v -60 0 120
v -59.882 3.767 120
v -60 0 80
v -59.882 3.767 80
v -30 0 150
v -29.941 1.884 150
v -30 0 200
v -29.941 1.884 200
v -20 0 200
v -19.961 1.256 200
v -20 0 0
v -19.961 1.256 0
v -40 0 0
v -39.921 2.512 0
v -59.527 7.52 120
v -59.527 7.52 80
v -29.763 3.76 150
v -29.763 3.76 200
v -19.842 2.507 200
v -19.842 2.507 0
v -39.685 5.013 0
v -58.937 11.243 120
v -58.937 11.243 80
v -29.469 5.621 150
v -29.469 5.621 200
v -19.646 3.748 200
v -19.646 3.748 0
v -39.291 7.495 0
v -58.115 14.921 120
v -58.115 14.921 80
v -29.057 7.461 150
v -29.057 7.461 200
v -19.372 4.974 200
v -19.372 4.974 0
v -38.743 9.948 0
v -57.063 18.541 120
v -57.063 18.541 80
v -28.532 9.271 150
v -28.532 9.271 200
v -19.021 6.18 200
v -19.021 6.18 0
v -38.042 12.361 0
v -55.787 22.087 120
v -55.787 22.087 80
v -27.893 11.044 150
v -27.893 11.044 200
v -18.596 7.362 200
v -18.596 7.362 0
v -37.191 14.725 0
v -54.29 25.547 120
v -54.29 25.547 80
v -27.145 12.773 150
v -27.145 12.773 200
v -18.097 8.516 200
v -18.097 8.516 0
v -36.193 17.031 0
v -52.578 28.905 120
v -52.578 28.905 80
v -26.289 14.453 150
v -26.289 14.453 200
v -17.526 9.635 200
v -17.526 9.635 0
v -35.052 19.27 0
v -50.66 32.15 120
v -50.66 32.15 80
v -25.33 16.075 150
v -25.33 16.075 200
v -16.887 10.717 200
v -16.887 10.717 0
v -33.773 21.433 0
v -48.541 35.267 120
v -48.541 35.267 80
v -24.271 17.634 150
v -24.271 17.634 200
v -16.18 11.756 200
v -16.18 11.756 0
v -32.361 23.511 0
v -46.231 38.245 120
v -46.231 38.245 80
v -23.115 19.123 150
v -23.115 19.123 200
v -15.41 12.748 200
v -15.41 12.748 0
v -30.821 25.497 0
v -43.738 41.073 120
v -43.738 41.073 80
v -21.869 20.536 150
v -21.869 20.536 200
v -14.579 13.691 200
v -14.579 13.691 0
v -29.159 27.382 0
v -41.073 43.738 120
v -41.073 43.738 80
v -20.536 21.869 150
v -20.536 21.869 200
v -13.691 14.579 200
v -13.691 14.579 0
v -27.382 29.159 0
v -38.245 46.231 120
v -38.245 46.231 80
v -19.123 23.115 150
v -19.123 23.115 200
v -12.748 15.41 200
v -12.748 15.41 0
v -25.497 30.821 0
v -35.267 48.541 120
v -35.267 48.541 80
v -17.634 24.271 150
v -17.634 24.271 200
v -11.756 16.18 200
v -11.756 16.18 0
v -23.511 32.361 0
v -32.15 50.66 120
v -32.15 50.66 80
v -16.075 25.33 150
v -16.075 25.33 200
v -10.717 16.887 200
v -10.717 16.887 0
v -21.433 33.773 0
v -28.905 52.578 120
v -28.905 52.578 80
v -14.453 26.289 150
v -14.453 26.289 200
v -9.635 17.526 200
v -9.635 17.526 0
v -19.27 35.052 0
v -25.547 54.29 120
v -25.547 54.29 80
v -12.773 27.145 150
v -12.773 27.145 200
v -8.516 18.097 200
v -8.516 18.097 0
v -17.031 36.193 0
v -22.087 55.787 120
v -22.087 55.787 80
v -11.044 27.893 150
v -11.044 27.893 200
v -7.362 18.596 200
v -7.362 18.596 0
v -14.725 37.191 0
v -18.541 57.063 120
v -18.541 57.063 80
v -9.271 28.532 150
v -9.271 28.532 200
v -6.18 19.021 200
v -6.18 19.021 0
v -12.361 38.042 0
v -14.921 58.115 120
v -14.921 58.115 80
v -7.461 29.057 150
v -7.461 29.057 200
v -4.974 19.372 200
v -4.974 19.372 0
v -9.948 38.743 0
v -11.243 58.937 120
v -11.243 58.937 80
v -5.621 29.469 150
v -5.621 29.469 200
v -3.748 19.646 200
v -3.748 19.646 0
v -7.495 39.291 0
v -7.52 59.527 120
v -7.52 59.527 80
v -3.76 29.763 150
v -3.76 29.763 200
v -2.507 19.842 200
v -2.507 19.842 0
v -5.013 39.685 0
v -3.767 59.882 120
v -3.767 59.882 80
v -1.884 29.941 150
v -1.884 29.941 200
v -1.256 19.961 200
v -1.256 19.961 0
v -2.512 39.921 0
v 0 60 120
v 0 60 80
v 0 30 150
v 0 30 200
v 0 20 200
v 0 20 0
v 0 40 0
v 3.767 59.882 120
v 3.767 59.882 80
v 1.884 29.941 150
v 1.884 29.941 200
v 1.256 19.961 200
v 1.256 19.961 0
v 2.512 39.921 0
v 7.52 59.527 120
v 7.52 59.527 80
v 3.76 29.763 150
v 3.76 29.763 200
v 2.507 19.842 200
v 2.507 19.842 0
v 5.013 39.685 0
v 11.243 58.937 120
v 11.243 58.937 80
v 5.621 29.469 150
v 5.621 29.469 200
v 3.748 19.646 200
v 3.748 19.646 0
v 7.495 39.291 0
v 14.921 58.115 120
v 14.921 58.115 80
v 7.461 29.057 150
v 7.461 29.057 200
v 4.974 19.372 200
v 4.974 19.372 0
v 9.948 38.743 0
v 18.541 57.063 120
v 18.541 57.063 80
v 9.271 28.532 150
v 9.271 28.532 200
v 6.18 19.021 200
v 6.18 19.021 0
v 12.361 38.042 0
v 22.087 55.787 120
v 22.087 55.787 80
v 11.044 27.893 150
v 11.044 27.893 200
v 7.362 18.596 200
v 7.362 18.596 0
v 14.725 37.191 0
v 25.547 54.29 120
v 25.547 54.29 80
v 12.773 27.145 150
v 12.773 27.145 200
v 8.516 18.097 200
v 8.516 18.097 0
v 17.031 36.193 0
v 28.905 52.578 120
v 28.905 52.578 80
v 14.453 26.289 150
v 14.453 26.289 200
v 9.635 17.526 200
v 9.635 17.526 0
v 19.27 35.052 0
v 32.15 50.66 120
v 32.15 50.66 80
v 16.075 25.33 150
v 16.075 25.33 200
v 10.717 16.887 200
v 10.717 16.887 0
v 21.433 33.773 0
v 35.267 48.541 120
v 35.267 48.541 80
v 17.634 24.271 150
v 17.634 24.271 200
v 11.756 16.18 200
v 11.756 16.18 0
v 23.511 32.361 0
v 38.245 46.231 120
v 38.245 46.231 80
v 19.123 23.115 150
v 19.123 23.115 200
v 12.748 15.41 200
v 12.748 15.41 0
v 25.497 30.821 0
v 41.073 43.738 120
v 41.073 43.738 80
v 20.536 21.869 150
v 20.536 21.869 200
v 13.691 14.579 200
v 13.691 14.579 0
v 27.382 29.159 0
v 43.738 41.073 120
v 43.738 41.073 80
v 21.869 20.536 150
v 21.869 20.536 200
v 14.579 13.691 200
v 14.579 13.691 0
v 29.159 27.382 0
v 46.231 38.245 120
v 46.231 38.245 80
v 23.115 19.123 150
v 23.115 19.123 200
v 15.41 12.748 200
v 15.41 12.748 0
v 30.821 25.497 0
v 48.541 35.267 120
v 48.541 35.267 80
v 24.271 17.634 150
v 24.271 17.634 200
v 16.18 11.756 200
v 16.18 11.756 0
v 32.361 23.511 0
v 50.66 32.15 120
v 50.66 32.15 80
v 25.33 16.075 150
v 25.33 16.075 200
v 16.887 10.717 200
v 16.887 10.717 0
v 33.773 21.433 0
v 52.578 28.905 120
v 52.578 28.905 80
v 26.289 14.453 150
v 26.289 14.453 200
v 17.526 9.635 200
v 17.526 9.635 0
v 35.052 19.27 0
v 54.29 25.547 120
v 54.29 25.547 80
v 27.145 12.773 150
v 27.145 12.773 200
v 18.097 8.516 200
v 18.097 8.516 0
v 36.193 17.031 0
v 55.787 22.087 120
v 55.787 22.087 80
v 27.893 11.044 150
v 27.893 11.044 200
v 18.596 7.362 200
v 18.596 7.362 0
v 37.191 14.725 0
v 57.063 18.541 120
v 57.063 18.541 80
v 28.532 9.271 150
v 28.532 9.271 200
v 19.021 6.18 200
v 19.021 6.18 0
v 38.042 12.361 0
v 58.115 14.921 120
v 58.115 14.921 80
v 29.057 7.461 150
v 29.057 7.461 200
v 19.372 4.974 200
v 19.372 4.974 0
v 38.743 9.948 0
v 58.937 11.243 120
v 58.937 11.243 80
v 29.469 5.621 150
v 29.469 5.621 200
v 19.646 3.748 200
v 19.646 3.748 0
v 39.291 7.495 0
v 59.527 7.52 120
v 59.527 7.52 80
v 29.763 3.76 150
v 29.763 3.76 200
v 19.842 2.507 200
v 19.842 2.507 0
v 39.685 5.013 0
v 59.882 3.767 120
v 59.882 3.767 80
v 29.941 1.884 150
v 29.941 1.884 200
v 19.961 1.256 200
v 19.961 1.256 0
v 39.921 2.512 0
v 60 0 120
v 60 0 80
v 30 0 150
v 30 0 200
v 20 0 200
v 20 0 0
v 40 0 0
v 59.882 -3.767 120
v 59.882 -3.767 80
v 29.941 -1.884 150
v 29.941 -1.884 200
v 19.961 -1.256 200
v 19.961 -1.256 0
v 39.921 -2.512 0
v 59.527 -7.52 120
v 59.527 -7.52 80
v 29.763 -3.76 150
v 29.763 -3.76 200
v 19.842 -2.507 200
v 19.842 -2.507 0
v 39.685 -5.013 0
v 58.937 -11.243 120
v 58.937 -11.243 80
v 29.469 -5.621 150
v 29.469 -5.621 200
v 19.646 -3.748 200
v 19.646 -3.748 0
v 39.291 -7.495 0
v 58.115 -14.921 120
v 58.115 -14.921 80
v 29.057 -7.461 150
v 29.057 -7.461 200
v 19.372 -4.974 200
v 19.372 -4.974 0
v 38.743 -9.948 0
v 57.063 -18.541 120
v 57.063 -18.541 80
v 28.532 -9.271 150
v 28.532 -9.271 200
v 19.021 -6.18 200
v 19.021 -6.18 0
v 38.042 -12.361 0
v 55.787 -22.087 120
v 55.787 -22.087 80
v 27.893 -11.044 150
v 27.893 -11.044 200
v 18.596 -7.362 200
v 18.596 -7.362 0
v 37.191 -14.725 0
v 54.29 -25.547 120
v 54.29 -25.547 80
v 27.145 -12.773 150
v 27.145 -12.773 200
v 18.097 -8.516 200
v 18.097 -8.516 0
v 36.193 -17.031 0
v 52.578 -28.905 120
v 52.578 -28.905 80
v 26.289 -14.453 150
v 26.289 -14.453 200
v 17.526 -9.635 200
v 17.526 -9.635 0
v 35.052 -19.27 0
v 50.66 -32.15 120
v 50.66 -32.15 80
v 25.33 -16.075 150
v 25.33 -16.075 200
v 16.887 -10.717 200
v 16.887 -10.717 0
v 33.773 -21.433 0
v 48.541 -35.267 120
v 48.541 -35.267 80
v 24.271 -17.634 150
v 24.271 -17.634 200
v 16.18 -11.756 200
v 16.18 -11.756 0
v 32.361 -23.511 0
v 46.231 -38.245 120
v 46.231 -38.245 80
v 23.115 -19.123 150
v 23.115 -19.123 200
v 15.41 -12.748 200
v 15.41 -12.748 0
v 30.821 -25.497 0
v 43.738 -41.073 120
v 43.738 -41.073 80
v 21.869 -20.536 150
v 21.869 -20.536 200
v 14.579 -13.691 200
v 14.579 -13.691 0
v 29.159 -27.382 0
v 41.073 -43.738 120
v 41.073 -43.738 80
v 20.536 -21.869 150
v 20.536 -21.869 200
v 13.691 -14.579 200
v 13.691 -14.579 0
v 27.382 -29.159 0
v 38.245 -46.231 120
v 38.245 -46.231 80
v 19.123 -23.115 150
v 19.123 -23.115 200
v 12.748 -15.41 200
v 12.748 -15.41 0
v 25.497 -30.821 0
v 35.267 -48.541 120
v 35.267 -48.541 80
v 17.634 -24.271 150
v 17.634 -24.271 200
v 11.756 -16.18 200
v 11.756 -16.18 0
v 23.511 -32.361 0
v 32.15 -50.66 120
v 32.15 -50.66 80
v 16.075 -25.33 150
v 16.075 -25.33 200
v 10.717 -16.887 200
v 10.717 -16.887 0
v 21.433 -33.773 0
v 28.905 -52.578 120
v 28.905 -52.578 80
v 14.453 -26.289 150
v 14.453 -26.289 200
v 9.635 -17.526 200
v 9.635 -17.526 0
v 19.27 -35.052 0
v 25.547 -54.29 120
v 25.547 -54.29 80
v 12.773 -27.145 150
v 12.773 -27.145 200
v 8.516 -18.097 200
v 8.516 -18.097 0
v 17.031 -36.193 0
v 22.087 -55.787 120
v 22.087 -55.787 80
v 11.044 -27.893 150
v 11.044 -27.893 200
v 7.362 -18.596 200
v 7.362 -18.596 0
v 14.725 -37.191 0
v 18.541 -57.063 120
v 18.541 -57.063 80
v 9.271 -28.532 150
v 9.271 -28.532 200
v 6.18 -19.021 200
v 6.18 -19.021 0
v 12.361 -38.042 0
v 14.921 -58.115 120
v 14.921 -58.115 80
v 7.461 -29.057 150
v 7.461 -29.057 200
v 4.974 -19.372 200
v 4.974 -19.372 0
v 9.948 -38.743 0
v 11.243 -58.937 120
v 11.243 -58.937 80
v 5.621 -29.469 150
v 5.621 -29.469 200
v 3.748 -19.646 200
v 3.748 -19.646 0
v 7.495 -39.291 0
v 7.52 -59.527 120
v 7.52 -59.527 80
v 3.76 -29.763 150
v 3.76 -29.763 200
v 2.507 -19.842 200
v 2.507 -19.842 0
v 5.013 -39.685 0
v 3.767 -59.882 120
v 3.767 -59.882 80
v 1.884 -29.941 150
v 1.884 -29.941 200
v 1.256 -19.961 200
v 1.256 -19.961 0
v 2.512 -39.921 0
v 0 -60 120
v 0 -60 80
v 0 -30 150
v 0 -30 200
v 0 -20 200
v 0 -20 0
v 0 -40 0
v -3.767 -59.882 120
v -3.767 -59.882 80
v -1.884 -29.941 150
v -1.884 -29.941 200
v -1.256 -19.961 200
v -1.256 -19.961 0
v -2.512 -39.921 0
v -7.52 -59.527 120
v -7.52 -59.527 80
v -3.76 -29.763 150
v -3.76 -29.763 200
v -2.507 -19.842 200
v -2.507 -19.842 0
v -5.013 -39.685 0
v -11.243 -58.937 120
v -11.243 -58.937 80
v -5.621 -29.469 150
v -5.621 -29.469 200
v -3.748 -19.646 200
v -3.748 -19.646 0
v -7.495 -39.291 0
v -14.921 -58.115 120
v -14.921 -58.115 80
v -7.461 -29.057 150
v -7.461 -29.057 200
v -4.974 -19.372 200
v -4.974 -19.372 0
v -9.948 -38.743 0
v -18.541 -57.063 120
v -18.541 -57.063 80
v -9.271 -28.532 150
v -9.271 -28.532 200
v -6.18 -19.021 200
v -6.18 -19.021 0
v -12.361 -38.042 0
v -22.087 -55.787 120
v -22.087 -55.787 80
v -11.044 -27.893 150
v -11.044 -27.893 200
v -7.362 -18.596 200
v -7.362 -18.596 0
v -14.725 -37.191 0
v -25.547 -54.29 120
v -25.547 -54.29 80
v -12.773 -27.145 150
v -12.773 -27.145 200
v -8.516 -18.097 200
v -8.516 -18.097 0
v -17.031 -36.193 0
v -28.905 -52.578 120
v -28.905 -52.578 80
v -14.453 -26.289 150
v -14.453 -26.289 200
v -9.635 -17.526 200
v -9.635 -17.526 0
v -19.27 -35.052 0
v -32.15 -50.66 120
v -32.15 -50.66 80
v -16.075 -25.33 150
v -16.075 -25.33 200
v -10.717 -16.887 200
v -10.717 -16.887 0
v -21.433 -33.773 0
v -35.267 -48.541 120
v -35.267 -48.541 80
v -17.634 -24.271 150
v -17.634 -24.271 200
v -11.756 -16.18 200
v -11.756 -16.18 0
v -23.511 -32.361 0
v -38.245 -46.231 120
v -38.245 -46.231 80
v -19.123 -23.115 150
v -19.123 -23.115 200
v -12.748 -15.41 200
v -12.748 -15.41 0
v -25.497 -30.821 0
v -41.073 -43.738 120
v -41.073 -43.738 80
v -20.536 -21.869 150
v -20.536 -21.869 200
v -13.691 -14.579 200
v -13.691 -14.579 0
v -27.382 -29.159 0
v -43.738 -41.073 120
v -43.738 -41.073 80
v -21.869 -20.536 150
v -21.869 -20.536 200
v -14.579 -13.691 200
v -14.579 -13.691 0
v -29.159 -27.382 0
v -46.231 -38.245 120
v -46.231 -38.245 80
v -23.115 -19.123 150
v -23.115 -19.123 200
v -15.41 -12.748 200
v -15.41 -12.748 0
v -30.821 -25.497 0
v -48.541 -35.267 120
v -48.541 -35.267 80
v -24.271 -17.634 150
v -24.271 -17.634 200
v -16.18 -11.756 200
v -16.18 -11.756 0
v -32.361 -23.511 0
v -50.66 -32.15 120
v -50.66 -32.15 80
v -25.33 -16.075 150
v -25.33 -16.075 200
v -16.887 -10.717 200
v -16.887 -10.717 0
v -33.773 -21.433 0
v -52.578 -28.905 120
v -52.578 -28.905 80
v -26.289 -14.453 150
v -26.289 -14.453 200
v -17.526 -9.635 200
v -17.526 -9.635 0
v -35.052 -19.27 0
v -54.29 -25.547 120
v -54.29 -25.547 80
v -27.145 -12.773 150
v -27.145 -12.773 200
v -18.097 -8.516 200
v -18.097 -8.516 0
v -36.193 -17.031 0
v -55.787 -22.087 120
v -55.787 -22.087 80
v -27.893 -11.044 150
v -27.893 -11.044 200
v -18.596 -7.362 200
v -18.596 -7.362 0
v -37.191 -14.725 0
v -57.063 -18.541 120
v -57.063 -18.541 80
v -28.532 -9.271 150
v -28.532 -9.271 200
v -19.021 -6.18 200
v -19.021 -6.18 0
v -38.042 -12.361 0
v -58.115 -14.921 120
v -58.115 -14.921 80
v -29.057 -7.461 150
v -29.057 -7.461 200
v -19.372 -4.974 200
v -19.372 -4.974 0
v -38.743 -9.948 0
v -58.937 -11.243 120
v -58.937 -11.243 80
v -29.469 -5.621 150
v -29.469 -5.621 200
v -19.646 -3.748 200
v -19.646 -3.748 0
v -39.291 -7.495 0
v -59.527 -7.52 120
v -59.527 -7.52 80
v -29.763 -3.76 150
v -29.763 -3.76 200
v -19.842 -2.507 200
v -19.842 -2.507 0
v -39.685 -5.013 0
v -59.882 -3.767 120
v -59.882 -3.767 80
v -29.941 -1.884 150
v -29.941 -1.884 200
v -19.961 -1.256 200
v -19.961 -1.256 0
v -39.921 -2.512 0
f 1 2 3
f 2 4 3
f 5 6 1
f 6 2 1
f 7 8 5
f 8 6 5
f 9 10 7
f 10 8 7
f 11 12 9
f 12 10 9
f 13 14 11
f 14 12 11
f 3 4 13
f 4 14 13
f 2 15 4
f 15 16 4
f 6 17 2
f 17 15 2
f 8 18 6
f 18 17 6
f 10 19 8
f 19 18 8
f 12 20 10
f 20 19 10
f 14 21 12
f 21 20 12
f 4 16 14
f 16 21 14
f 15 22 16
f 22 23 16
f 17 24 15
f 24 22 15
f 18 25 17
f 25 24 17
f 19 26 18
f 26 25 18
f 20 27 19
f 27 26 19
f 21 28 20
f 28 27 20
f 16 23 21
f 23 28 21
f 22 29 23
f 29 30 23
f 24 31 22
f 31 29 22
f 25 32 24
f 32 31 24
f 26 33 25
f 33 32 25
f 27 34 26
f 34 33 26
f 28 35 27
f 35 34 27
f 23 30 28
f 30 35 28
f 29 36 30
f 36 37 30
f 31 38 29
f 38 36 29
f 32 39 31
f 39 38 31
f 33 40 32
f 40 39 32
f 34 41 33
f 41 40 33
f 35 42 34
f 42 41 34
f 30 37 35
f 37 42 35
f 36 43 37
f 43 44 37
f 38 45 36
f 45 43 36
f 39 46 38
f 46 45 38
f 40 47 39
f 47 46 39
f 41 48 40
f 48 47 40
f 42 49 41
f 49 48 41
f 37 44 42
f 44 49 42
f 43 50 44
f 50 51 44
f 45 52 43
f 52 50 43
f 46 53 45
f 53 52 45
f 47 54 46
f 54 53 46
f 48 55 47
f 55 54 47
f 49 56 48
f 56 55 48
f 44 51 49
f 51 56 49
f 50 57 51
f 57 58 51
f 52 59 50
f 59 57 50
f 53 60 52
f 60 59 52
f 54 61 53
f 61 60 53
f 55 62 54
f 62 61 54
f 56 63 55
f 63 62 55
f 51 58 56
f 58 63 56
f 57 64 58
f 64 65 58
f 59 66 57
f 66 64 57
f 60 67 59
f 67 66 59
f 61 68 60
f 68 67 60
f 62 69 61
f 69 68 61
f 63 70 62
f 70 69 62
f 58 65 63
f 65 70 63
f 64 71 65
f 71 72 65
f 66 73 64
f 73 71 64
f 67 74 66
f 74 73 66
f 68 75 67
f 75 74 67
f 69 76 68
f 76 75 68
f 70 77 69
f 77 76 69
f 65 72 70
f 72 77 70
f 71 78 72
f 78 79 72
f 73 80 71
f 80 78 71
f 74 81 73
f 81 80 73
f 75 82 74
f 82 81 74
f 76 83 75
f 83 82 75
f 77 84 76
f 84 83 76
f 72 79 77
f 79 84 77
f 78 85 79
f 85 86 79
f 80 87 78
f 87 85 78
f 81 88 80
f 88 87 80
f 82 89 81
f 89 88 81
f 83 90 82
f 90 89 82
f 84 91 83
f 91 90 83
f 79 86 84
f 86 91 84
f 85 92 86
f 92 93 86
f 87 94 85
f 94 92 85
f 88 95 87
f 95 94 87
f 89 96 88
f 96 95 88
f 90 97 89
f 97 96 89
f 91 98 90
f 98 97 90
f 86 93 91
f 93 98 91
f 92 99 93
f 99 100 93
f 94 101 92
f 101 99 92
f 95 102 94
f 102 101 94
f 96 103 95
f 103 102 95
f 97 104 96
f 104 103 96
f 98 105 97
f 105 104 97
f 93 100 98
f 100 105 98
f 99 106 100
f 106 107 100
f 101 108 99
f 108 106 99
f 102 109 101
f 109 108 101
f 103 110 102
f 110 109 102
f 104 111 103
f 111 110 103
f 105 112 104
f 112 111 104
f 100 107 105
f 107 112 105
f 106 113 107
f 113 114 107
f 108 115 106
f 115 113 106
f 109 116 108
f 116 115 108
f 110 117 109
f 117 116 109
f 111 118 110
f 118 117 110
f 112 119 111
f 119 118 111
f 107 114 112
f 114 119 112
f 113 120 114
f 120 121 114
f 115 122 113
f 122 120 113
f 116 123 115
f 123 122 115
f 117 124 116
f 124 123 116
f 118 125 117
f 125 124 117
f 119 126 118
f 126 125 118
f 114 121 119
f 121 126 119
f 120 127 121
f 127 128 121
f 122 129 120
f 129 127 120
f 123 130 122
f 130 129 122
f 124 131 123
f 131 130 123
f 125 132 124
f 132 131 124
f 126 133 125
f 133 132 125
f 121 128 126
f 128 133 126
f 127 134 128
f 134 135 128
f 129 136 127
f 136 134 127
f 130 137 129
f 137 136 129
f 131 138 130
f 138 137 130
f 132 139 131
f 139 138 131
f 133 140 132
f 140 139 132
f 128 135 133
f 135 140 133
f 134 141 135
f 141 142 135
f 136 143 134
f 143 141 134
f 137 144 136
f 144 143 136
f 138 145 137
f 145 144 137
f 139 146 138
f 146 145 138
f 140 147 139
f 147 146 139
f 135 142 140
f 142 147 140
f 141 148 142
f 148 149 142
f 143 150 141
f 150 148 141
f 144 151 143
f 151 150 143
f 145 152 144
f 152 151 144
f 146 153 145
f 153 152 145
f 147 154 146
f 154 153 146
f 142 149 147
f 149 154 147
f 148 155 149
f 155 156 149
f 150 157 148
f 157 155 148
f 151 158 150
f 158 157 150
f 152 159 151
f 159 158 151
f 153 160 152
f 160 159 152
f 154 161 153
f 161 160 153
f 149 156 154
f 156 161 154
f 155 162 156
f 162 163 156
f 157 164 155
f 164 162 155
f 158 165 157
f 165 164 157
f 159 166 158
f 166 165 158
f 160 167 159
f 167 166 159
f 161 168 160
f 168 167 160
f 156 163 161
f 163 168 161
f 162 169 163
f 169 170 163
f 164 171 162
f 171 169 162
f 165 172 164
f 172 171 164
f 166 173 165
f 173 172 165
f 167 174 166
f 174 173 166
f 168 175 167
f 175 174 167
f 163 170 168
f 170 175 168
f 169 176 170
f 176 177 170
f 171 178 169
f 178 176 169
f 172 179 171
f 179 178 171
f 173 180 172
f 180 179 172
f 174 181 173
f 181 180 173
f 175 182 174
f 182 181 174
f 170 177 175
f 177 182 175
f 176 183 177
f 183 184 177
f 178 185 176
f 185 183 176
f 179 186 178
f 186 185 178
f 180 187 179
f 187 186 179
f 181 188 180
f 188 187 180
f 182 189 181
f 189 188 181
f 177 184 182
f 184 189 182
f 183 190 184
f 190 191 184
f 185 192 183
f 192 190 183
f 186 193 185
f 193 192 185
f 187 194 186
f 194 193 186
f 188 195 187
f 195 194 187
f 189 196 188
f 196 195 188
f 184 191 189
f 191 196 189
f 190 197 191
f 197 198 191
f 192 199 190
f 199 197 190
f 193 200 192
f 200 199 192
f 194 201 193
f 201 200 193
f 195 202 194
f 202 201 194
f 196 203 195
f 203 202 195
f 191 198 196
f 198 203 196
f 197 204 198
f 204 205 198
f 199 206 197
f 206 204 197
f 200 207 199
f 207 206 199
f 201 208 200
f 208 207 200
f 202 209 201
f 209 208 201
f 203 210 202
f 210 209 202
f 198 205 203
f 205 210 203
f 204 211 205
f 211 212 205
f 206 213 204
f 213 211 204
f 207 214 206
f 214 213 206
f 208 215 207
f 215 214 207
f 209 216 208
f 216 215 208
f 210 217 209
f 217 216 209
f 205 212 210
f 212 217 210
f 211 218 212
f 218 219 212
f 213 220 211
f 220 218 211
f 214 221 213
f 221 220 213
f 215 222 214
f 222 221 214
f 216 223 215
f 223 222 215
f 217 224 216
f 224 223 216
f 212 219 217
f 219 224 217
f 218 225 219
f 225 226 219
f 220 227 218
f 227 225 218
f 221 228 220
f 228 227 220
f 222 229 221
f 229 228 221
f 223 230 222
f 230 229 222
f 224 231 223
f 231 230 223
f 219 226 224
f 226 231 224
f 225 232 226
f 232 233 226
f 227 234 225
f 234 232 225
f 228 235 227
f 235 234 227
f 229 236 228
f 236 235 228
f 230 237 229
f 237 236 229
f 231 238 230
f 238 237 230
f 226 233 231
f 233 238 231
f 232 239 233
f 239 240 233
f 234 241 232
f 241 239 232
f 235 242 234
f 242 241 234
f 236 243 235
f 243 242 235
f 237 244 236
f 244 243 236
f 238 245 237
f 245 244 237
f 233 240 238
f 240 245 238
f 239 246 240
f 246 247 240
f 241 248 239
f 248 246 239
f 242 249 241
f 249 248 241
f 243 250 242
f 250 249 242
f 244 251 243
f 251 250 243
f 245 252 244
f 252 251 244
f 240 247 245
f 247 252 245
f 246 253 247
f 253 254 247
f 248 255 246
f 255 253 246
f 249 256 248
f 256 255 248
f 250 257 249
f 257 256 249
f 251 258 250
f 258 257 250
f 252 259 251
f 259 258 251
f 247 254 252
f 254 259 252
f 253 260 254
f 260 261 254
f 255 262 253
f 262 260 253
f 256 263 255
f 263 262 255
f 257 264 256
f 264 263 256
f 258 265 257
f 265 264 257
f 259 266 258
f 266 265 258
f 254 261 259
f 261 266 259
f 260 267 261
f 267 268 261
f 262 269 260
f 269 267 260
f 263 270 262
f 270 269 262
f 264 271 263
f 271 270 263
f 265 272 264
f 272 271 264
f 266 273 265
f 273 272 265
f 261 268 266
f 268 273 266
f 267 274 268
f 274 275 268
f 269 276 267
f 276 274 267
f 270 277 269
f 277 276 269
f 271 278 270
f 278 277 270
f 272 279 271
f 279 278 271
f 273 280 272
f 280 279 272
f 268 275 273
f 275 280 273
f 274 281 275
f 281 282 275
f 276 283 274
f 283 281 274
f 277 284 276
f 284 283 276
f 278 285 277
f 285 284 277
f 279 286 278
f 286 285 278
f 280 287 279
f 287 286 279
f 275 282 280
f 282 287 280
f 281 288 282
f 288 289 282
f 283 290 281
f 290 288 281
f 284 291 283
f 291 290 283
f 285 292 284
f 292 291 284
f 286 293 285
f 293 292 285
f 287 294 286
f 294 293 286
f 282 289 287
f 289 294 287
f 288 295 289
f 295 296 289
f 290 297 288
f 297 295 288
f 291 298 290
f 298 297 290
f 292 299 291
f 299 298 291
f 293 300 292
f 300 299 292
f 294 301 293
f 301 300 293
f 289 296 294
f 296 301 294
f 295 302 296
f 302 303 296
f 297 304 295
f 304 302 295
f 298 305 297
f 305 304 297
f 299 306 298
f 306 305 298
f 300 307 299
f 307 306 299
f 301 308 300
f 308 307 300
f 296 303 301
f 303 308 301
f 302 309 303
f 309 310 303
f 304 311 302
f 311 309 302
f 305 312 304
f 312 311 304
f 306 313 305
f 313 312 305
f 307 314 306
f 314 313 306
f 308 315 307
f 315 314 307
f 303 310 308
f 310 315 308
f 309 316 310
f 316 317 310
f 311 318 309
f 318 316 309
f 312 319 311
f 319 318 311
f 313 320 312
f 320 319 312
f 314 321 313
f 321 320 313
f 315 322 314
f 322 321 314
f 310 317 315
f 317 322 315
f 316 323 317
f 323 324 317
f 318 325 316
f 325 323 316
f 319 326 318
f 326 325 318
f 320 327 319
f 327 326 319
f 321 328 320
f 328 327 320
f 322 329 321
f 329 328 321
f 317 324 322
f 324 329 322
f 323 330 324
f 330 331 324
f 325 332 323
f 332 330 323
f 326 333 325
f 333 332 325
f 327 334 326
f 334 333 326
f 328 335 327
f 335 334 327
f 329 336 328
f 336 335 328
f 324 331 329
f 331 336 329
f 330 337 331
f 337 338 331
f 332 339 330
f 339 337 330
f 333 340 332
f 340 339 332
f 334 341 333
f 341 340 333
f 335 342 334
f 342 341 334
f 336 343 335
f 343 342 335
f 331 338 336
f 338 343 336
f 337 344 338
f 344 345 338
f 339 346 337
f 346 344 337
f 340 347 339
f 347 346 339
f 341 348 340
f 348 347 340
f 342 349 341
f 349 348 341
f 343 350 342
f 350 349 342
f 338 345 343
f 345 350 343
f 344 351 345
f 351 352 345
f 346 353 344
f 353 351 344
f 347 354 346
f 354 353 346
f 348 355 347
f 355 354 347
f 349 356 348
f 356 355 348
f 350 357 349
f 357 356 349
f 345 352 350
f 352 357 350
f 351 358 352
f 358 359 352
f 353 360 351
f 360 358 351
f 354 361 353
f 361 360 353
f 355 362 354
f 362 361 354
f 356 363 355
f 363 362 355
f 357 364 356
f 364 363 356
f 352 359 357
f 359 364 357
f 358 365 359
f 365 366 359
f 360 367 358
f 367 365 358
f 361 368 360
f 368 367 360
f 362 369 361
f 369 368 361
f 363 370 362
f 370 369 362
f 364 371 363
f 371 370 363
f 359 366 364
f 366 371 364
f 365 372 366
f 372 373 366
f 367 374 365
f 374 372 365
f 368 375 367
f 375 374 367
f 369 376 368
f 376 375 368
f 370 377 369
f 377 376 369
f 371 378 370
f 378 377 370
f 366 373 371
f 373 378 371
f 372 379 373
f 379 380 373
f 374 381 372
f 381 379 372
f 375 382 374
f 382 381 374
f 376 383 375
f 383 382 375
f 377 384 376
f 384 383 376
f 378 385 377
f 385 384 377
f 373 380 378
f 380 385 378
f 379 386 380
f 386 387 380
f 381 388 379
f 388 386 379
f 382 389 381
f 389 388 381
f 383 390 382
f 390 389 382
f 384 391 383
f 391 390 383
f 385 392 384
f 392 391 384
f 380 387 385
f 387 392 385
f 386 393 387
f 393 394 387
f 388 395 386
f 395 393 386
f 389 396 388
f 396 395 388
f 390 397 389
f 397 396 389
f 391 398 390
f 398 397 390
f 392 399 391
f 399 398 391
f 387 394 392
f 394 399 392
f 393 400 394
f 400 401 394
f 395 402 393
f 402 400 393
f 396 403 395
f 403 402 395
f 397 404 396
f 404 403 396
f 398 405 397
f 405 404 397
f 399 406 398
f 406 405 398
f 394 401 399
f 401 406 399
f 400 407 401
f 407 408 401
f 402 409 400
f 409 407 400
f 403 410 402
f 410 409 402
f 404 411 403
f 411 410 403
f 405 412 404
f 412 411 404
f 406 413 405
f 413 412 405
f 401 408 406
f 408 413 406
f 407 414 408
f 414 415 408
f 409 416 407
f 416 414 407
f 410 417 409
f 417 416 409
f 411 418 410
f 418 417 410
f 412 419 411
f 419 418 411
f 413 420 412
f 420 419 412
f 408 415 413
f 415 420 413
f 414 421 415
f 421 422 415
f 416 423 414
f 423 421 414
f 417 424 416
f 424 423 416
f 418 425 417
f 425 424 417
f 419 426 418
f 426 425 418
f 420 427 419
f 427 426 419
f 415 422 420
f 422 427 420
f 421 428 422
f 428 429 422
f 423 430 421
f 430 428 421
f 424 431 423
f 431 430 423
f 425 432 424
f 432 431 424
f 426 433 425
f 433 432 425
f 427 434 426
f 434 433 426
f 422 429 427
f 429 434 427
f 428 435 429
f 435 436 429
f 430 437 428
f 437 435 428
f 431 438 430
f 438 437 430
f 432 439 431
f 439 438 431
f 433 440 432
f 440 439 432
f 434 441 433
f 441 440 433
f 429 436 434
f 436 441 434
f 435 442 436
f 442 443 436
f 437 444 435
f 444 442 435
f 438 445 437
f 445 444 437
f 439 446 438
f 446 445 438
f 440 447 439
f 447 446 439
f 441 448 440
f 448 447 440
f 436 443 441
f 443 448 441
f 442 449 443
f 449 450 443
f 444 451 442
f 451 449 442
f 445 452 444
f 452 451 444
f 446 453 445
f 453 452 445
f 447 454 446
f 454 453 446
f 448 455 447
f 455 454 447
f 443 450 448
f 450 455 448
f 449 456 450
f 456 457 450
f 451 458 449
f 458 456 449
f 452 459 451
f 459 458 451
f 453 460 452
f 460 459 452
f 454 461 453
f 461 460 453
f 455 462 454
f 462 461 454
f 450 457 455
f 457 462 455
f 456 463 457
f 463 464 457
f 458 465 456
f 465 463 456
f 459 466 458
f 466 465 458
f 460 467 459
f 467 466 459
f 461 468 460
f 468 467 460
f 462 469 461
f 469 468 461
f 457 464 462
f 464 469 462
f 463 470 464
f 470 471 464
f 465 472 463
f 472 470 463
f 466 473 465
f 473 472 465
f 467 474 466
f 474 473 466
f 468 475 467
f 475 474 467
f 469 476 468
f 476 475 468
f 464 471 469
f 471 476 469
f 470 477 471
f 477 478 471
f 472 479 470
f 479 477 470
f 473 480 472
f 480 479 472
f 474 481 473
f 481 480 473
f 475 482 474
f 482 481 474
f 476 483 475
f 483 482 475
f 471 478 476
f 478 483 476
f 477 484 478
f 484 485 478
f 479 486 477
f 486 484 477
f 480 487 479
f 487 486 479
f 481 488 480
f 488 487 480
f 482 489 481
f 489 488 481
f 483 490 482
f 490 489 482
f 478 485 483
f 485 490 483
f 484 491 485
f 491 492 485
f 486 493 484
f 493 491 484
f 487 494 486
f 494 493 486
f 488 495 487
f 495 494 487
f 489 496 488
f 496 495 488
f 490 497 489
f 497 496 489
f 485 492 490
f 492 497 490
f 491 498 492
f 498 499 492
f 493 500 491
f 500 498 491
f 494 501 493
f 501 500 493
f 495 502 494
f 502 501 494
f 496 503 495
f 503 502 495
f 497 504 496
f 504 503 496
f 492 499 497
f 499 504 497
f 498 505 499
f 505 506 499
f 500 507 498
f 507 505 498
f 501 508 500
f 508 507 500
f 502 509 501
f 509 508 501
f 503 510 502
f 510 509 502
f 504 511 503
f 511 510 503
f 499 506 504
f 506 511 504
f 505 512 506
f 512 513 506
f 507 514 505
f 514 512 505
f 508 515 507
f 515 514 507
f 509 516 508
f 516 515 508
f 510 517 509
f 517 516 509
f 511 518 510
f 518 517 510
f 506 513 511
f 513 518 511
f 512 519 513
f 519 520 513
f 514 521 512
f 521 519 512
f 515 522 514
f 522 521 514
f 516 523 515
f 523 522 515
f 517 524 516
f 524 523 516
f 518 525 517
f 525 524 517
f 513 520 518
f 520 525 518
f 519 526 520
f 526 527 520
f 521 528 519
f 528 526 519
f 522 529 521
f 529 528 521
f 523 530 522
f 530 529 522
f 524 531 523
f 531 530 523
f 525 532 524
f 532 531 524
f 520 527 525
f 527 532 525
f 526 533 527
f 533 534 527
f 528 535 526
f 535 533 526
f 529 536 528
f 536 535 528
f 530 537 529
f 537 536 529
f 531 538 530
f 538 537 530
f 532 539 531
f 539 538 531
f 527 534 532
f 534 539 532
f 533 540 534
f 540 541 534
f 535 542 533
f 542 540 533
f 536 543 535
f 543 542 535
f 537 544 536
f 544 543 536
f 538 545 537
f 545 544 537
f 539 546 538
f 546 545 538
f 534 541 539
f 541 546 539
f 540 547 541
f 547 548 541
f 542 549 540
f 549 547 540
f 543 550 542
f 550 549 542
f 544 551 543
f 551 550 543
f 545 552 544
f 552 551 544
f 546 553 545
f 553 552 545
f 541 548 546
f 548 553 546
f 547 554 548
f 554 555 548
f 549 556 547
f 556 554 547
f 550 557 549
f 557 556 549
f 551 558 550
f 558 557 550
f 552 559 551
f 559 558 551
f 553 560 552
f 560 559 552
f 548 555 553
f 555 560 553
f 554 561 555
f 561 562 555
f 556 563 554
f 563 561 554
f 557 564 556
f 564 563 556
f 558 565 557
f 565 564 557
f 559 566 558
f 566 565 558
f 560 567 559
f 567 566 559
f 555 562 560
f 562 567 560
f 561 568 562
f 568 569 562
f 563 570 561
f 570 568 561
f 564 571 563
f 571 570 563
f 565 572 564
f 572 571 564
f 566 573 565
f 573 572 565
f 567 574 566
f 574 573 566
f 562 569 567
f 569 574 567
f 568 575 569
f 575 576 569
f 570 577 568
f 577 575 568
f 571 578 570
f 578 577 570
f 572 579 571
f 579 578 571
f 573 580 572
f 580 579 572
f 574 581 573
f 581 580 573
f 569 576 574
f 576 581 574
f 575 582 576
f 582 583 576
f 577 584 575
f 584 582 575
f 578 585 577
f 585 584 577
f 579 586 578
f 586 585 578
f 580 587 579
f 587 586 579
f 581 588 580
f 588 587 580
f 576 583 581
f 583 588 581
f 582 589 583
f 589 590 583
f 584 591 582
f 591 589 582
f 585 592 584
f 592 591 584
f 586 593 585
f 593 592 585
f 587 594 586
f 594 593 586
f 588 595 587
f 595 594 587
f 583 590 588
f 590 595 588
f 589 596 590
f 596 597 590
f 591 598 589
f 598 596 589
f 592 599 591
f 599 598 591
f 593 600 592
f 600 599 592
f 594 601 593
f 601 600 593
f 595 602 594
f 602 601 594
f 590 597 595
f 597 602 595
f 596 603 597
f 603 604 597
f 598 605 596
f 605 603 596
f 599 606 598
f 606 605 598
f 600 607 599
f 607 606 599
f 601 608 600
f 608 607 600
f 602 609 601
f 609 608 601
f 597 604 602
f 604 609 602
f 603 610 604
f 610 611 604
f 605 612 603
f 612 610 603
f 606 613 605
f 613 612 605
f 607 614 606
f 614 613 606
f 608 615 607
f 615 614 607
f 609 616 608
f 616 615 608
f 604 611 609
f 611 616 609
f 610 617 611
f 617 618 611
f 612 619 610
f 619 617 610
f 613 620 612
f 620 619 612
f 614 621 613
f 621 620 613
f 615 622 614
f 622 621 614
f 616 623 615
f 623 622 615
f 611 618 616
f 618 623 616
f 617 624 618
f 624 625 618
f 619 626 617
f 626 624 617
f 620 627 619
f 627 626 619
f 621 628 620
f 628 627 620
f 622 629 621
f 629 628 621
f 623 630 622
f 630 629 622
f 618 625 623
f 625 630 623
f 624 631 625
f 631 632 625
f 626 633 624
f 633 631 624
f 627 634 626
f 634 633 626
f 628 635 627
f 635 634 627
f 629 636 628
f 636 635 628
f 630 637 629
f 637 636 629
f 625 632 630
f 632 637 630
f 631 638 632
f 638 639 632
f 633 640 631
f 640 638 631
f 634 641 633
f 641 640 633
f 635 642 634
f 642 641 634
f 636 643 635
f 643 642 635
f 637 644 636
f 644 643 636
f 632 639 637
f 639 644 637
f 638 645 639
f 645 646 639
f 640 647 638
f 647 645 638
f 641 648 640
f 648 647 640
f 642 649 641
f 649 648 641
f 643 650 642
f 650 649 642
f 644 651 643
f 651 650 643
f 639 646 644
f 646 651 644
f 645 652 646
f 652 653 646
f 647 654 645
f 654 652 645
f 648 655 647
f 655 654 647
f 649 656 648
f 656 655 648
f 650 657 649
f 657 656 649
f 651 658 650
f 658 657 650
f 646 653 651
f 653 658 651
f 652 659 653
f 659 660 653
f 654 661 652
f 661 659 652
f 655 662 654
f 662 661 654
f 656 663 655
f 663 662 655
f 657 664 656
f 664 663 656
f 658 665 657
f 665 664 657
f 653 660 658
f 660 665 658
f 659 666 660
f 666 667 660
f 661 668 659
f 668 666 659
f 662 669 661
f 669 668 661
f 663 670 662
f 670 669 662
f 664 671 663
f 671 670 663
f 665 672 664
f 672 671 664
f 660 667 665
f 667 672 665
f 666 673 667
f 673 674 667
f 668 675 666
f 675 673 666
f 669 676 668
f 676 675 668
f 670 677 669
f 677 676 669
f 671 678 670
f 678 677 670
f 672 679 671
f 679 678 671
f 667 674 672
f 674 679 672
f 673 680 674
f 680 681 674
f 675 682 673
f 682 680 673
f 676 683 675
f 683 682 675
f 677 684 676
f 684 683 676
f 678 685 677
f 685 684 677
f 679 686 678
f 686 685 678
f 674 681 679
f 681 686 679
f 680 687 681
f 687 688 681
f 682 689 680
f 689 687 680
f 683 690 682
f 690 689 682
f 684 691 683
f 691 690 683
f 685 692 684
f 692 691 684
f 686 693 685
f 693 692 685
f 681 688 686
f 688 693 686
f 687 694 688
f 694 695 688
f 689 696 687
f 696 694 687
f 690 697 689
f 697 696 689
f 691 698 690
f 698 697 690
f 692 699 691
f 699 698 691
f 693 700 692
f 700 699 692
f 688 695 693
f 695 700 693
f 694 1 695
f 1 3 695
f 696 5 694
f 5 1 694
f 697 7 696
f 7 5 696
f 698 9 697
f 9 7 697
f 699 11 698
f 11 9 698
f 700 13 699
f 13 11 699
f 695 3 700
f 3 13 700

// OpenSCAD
// Parameters
height = 200;         // Total height of the vase
base_radius = 20;     // Radius of the base
max_radius = 40;      // Maximum radius of the vase
neck_radius = 10;     // Radius of the neck
neck_height = 50;     // Height of the neck section

// Vase profile
module vase_profile() {
    polygon(points=[
        [0, 0],
        [base_radius, 0],
        [max_radius, height * 0.4],
        [max_radius, height * 0.6],
        [neck_radius, height - neck_height],
        [neck_radius, height],
        [0, height]
    ]);
}

// Vase module
module vase() {
    rotate_extrude($fn=100)
        translate([base_radius, 0])
        vase_profile();
}

// Render the vase
vase();
